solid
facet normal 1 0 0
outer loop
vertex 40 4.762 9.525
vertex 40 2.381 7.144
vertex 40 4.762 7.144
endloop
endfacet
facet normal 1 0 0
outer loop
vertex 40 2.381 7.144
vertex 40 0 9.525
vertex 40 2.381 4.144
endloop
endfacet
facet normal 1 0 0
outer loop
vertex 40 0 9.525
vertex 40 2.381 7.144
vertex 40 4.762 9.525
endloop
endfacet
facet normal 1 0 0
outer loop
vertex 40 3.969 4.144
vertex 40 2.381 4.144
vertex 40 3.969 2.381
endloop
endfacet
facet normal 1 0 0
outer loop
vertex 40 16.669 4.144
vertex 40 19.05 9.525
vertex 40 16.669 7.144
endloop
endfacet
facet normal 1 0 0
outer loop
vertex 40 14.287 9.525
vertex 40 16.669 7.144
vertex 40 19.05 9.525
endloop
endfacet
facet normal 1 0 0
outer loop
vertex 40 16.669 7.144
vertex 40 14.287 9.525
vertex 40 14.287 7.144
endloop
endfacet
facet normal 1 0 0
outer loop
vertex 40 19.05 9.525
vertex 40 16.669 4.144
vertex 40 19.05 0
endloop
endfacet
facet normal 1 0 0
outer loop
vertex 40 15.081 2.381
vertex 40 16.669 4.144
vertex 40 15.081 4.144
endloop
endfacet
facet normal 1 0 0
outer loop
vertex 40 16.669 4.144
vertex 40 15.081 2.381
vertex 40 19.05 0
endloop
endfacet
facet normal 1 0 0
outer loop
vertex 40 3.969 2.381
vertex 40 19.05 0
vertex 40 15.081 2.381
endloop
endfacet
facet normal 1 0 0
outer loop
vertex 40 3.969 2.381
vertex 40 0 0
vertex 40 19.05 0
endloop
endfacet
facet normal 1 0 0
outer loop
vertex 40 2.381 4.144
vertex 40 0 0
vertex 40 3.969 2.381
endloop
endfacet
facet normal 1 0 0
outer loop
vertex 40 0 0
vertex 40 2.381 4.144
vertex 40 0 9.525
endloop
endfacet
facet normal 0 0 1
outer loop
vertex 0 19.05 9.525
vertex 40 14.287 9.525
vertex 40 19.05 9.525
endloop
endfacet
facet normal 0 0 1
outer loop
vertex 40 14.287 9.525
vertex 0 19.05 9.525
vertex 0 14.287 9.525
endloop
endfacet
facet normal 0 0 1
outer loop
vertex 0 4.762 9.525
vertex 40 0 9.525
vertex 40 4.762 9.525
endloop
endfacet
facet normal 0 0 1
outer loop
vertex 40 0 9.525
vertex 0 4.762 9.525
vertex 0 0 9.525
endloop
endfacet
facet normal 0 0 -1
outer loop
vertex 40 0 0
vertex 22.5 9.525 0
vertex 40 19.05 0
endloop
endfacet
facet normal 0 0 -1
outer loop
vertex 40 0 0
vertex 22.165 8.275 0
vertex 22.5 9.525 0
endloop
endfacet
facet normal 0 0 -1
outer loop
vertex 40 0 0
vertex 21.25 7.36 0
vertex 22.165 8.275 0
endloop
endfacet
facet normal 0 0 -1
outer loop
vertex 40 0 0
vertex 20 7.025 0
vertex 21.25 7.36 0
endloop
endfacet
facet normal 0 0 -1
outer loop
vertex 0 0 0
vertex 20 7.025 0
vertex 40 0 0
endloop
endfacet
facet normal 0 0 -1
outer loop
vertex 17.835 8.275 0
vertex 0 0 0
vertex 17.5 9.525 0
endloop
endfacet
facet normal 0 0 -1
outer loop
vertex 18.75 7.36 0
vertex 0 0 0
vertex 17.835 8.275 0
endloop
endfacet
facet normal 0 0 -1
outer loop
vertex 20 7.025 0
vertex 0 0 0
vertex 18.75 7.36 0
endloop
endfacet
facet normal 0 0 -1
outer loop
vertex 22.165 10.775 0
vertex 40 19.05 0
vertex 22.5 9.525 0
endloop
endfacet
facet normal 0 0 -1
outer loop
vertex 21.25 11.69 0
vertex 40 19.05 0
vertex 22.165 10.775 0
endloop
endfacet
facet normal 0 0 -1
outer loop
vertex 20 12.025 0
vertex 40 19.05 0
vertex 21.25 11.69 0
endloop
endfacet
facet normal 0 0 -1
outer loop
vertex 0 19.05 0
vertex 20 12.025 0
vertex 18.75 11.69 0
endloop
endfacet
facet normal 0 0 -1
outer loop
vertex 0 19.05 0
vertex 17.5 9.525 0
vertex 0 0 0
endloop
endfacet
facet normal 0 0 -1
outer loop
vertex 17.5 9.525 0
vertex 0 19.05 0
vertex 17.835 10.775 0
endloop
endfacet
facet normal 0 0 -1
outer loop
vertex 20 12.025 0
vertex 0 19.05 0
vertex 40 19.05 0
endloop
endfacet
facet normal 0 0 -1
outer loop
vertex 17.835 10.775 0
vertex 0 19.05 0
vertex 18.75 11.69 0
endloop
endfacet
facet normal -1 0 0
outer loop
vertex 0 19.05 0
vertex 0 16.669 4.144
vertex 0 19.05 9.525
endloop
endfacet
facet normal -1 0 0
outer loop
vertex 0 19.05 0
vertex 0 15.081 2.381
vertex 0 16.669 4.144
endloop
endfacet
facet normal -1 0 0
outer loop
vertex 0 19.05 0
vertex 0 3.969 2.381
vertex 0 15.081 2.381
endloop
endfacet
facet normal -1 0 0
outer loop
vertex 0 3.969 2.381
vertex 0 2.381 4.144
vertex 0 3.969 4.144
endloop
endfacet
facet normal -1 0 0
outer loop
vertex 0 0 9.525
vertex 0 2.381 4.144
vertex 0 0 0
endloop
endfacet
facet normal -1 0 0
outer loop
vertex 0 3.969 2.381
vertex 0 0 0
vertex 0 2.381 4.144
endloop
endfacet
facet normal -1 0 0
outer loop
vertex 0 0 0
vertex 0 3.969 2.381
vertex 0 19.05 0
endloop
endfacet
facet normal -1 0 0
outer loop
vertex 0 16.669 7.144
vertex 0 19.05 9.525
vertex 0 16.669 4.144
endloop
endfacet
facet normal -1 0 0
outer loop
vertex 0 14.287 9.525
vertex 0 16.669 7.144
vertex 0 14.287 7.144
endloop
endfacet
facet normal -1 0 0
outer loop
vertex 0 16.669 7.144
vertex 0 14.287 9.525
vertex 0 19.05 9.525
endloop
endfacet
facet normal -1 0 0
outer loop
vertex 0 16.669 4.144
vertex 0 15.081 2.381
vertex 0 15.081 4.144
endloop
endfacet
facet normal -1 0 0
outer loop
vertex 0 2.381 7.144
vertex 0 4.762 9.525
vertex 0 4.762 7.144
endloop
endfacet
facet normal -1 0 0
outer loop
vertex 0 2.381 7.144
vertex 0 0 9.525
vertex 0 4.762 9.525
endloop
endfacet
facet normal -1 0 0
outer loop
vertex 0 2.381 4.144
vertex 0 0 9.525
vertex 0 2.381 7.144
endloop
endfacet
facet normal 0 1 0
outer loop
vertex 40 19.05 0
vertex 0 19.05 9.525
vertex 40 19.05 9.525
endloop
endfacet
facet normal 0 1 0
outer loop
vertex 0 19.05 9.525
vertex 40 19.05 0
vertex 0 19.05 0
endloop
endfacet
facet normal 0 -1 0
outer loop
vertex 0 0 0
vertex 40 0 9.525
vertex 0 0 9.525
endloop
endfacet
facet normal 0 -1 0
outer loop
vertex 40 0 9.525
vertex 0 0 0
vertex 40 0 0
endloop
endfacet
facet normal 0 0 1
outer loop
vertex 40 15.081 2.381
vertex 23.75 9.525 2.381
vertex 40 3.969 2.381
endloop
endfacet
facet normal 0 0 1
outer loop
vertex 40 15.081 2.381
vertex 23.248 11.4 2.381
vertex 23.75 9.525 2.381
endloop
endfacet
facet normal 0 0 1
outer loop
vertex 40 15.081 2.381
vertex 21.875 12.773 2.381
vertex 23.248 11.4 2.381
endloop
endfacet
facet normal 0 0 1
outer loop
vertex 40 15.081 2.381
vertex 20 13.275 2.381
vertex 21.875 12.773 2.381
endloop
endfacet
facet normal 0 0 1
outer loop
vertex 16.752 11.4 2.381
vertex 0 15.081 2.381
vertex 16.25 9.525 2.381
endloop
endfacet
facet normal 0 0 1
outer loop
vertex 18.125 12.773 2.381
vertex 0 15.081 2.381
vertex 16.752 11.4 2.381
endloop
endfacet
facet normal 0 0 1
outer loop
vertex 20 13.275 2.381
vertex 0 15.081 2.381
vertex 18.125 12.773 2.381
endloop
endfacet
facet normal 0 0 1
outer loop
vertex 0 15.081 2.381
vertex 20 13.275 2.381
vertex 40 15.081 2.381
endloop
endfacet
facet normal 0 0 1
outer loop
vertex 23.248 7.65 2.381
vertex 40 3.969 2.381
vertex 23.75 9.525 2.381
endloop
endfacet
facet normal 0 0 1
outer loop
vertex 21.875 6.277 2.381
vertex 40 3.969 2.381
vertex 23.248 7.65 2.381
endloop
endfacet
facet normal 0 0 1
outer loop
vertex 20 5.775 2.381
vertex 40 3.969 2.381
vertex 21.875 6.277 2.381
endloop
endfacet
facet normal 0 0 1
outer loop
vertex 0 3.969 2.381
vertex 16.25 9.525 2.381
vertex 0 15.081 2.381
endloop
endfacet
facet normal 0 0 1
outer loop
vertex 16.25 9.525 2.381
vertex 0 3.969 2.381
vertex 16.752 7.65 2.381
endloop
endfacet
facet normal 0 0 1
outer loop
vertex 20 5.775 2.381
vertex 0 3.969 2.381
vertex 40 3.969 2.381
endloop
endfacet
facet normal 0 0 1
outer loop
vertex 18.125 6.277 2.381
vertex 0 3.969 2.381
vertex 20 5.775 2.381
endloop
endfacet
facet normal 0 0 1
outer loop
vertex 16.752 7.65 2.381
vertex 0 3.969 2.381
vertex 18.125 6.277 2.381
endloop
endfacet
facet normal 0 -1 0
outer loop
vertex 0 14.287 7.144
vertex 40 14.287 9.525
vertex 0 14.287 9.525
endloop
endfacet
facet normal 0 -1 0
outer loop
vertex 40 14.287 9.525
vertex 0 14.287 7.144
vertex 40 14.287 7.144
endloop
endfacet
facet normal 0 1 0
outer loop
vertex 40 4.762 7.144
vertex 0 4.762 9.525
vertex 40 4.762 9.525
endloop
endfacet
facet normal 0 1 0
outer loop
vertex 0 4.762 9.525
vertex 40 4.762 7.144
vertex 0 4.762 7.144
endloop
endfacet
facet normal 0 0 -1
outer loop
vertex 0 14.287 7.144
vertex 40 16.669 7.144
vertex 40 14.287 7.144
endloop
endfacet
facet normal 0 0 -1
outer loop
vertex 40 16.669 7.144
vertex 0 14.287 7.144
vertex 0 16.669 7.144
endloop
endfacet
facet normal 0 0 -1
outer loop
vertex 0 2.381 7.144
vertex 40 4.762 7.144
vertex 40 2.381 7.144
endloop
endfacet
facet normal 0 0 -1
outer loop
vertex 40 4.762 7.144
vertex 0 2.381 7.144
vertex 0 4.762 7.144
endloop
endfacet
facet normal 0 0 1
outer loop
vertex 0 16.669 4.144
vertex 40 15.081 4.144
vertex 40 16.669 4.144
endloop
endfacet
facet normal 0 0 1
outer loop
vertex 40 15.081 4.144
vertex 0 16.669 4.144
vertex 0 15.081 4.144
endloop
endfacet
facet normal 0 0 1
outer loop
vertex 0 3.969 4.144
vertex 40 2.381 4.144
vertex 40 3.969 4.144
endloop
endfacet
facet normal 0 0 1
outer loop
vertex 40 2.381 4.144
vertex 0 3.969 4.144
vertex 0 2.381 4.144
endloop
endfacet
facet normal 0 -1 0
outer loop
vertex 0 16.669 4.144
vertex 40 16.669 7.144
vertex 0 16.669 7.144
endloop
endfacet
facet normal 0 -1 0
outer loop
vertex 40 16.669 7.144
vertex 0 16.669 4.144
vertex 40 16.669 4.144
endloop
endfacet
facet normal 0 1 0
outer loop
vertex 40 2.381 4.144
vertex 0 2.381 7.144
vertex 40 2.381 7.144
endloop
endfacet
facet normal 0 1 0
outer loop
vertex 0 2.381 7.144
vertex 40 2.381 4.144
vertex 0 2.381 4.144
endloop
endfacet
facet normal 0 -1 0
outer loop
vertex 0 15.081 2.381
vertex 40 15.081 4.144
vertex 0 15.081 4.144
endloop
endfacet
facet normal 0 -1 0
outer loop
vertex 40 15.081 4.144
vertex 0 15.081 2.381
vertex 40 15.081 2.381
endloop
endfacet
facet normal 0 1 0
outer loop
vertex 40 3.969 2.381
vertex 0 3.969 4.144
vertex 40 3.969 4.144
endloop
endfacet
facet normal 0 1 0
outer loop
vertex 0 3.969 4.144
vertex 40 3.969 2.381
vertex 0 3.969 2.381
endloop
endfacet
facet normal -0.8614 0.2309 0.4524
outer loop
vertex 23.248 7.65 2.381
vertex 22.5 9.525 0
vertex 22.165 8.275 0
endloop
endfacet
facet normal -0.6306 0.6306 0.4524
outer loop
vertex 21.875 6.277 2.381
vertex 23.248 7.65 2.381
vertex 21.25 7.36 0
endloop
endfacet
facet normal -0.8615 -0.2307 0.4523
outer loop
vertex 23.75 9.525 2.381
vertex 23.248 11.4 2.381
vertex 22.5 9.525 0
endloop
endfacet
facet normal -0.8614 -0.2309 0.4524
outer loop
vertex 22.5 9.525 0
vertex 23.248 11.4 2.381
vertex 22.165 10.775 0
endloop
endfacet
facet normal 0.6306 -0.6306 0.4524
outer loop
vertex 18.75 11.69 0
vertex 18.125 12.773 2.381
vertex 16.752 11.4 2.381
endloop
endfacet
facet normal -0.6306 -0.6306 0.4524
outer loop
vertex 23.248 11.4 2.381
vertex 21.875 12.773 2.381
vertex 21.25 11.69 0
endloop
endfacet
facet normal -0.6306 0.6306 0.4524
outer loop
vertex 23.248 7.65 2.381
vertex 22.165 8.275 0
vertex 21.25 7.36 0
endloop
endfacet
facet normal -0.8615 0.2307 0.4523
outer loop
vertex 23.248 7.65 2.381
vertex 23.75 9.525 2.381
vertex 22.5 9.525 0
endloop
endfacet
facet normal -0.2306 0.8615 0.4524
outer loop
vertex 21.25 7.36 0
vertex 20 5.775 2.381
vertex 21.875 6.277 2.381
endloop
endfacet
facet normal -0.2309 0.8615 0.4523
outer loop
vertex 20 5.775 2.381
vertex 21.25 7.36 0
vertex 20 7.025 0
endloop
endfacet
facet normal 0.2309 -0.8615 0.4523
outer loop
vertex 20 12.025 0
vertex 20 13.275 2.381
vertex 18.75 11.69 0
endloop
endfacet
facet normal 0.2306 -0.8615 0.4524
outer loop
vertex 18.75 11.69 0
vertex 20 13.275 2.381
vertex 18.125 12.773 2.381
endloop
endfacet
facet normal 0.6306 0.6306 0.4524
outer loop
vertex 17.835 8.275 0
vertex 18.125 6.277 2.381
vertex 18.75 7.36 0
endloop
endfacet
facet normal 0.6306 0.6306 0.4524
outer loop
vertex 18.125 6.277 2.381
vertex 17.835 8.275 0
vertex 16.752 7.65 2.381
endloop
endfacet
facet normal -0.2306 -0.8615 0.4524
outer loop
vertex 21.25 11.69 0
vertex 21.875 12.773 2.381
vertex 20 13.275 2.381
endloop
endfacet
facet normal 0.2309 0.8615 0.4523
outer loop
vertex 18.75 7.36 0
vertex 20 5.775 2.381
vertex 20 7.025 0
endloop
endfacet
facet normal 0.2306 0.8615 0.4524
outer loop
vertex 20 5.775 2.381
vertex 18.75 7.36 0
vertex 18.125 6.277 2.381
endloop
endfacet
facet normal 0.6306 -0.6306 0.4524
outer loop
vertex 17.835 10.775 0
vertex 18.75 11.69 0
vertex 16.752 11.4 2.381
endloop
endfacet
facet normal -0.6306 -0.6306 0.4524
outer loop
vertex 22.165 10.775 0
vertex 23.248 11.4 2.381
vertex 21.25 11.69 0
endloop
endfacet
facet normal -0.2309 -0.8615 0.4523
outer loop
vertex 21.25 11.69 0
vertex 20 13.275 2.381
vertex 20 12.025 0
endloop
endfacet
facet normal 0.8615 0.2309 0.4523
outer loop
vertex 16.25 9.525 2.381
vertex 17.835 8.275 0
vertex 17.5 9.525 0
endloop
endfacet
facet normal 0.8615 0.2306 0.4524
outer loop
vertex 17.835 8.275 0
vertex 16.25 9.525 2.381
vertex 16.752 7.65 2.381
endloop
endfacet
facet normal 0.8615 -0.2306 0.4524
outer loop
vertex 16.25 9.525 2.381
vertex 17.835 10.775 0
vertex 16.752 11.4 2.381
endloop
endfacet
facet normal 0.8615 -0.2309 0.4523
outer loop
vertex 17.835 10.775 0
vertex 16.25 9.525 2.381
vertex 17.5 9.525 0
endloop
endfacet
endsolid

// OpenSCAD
//////////////////////////////
// File: ttrack.scad        //
// Title: T-Track           //
// Version: 1.0.0           //
// Author: Nicholas Feldman //
//////////////////////////////

// Description:
//
// T-Track for woodworking jigs and assembly tables.
// Designed based on Rockler and Powertec tracks.
// 
// I recommend printing on it's side lengthwise,
// with tree supports only touching the buildplate for accuracy and easy cleanup.
//
// Should be compatible with most T-Bolts,
// But values might need to be tweaked based on how accurate your printer is,
// as well as to account for horizontal expansion. However, I recommend tweaking
// the horizontal expansion value in your slicer instead of adjusting here.

// Version History:
//
// 1.0.0:
//   - Initial Version, create basic t-track profile

track_height = 9.525;
track_width = 19.05;
track_length = 40;

slot_width = 9.525;
slot_depth = 7.144;

// How far below the surface the "T" is
t_slot_depth = 2.381;
t_slot_width = 14.2875;
t_slot_height = 3;

// I don't know what the point of this phat bottom is but whatever
slot_bottom_width = 11.1125;
slot_bottom_height = slot_depth - t_slot_height - t_slot_depth;

screw_hole_width = 5;
screw_hole_height = track_height - slot_depth;

track_segments = 1;

module ttrack(t) {
    translate([track_length*(t-1), 0, 0])
    difference() {
        // Main Body of the track
        cube([track_length, track_width, track_height], 0);
        
        // Main slot cutout
        translate([0, (track_width/2)-(slot_width/2), track_height-slot_depth])
        cube([track_length, slot_width, slot_depth], 0);
        
        // Wider "T" cut out
        translate([0, (track_width/2)-(t_slot_width/2), track_height-t_slot_depth-t_slot_height])
        cube([track_length, t_slot_width, t_slot_height],0);
        
        // Bottom expansion cutout
        translate([0, (track_width/2)-(slot_bottom_width/2), track_height-t_slot_depth-t_slot_height - slot_bottom_height])
        cube([track_length, slot_bottom_width, slot_bottom_height], 0);
        
        // Counterunk screw hole
        translate([track_length/2, track_width/2, 0])
        cylinder(h=screw_hole_height, d1=screw_hole_width, d2=screw_hole_width*1.5);
        
   }
}

for (i = [1:track_segments]) {
    ttrack(i);
}
